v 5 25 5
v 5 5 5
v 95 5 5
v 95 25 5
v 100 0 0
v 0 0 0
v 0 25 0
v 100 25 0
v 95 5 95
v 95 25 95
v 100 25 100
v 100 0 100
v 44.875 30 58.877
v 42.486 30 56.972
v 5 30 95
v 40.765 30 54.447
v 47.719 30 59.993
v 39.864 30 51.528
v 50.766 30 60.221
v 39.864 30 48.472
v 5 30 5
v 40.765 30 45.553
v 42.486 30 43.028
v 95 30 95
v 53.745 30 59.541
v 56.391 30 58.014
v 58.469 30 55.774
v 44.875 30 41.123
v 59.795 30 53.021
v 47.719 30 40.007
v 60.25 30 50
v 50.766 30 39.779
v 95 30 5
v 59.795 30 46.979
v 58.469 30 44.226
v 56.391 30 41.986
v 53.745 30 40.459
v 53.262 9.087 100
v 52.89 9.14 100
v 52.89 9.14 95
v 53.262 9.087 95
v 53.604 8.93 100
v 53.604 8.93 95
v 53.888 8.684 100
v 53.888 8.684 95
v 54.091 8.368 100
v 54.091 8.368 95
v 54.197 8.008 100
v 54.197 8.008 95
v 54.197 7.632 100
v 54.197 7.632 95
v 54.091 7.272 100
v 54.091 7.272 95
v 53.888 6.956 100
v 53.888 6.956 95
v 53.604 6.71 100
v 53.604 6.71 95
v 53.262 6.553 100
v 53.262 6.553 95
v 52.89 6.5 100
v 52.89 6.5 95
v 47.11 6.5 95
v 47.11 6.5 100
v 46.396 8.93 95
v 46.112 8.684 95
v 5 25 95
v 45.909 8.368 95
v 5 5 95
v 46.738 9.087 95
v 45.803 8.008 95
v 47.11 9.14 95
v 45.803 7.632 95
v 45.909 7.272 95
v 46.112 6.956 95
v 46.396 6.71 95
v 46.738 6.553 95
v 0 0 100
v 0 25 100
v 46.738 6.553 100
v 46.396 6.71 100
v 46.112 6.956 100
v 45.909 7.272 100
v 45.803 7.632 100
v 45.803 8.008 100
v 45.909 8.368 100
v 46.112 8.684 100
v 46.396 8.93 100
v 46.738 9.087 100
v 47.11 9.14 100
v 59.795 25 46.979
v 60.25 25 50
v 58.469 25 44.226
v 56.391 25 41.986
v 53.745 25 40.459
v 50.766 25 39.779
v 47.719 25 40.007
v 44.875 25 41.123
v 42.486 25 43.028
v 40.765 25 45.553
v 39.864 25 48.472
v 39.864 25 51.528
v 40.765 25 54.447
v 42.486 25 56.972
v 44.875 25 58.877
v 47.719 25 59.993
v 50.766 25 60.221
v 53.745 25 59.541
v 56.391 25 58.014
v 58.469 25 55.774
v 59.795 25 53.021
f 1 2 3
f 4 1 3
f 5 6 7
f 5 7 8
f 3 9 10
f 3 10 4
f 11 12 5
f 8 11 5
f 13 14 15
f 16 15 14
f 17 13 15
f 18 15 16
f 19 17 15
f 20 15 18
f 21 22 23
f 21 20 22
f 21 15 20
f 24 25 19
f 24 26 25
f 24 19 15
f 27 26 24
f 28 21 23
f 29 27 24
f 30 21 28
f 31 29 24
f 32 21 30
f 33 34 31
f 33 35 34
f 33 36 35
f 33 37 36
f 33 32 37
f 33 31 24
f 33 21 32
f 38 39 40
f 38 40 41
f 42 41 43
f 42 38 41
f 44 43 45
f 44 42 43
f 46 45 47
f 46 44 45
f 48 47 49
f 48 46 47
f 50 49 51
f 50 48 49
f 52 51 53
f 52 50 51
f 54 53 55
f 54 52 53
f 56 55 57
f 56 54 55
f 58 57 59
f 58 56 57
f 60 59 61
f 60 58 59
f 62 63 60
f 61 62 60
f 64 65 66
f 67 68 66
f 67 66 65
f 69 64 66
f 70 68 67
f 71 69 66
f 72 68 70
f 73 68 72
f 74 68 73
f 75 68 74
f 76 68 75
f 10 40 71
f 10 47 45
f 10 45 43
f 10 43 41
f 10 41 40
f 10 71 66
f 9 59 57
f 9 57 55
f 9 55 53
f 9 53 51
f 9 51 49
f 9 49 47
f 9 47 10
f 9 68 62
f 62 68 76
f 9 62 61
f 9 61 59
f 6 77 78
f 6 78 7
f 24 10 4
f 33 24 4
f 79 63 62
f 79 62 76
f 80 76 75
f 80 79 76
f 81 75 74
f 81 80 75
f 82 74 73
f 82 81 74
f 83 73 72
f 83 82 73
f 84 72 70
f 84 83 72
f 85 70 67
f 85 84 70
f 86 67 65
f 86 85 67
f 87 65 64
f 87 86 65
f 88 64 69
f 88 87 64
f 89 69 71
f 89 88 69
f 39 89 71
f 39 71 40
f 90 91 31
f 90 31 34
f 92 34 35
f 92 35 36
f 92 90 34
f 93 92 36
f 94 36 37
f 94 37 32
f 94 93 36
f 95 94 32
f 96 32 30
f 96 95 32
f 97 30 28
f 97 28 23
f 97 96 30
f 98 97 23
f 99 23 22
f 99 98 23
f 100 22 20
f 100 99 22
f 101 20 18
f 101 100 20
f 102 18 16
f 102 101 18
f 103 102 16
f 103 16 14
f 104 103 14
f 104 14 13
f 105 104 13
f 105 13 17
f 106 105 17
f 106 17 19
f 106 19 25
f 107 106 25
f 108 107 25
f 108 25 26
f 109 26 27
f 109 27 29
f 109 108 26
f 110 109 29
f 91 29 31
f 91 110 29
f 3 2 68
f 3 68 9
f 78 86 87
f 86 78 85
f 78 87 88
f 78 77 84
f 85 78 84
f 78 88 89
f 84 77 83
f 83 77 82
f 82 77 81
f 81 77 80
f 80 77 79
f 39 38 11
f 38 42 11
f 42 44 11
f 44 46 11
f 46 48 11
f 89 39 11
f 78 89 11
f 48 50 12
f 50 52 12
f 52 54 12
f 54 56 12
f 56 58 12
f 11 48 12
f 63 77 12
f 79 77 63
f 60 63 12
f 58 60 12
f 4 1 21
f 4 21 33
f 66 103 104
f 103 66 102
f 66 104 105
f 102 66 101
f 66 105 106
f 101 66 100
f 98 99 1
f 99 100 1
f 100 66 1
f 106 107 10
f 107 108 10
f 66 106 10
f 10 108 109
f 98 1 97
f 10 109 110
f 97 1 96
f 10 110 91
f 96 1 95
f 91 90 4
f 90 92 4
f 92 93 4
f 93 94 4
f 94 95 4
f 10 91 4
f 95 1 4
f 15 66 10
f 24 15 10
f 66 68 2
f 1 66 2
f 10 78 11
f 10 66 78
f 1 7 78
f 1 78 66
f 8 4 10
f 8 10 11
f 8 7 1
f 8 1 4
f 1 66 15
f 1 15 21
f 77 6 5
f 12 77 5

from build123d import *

# Parameters (mm, degrees)
SKETCH1_W           = 100
SKETCH1_H           = 100
SKETCH1_W_2         = 90
SKETCH1_H_2         = 90
BOSS_EXTRUDE2_DEPTH = 25
SKETCH1_3_W         = 90
SKETCH1_3_H         = 90
BOSS_EXTRUDE3_DEPTH = 5
SKETCH3_W           = 90
SKETCH3_H           = 90
SKETCH3_R           = 10.25
BOSS_EXTRUDE7_DEPTH = 5
CUT_EXTRUDE1_DEPTH  = 10


with BuildPart() as part:
    # Sketch1 → Boss-Extrude2 (new body)
    with BuildSketch(Plane(origin=(0, 0, 0), x_dir=(1, 0, 0), z_dir=(0, 1, 0))):
        with Locations((50, -50)):
            Rectangle(SKETCH1_W, SKETCH1_H)
        with Locations((50, -50)):
            Rectangle(SKETCH1_W_2, SKETCH1_H_2, mode=Mode.SUBTRACT)
    extrude(amount=BOSS_EXTRUDE2_DEPTH)

    # Sketch1<3> → Boss-Extrude3 (add)
    with BuildSketch(Plane(origin=(0, 0, 0), x_dir=(1, 0, 0), z_dir=(0, 1, 0))):
        with Locations((50, -50)):
            Rectangle(SKETCH1_3_W, SKETCH1_3_H)
    extrude(amount=BOSS_EXTRUDE3_DEPTH)

    # Sketch5 → Cut-Extrude1 (cut)
    with BuildSketch(Plane.XY.offset(100)):
        with BuildLine():
            Line((52.89, 9.14), (47.11, 9.14))
            ThreePointArc((47.11, 9.14), (45.79, 7.82), (47.11, 6.5))
            Line((47.11, 6.5), (52.89, 6.5))
            ThreePointArc((52.89, 6.5), (54.21, 7.82), (52.89, 9.14))
        make_face()
    extrude(amount=-CUT_EXTRUDE1_DEPTH, mode=Mode.SUBTRACT)


with BuildPart() as body_2:
    # Sketch3 → Boss-Extrude7 (new body)
    with BuildSketch(Plane(origin=(0, 25, 0), x_dir=(1, 0, 0), z_dir=(0, 1, 0))):
        with Locations((50, -50)):
            Rectangle(SKETCH3_W, SKETCH3_H)
        with Locations((50, -50)):
            Circle(SKETCH3_R, mode=Mode.SUBTRACT)
    extrude(amount=BOSS_EXTRUDE7_DEPTH)


solid = Compound([part.part, body_2.part])
